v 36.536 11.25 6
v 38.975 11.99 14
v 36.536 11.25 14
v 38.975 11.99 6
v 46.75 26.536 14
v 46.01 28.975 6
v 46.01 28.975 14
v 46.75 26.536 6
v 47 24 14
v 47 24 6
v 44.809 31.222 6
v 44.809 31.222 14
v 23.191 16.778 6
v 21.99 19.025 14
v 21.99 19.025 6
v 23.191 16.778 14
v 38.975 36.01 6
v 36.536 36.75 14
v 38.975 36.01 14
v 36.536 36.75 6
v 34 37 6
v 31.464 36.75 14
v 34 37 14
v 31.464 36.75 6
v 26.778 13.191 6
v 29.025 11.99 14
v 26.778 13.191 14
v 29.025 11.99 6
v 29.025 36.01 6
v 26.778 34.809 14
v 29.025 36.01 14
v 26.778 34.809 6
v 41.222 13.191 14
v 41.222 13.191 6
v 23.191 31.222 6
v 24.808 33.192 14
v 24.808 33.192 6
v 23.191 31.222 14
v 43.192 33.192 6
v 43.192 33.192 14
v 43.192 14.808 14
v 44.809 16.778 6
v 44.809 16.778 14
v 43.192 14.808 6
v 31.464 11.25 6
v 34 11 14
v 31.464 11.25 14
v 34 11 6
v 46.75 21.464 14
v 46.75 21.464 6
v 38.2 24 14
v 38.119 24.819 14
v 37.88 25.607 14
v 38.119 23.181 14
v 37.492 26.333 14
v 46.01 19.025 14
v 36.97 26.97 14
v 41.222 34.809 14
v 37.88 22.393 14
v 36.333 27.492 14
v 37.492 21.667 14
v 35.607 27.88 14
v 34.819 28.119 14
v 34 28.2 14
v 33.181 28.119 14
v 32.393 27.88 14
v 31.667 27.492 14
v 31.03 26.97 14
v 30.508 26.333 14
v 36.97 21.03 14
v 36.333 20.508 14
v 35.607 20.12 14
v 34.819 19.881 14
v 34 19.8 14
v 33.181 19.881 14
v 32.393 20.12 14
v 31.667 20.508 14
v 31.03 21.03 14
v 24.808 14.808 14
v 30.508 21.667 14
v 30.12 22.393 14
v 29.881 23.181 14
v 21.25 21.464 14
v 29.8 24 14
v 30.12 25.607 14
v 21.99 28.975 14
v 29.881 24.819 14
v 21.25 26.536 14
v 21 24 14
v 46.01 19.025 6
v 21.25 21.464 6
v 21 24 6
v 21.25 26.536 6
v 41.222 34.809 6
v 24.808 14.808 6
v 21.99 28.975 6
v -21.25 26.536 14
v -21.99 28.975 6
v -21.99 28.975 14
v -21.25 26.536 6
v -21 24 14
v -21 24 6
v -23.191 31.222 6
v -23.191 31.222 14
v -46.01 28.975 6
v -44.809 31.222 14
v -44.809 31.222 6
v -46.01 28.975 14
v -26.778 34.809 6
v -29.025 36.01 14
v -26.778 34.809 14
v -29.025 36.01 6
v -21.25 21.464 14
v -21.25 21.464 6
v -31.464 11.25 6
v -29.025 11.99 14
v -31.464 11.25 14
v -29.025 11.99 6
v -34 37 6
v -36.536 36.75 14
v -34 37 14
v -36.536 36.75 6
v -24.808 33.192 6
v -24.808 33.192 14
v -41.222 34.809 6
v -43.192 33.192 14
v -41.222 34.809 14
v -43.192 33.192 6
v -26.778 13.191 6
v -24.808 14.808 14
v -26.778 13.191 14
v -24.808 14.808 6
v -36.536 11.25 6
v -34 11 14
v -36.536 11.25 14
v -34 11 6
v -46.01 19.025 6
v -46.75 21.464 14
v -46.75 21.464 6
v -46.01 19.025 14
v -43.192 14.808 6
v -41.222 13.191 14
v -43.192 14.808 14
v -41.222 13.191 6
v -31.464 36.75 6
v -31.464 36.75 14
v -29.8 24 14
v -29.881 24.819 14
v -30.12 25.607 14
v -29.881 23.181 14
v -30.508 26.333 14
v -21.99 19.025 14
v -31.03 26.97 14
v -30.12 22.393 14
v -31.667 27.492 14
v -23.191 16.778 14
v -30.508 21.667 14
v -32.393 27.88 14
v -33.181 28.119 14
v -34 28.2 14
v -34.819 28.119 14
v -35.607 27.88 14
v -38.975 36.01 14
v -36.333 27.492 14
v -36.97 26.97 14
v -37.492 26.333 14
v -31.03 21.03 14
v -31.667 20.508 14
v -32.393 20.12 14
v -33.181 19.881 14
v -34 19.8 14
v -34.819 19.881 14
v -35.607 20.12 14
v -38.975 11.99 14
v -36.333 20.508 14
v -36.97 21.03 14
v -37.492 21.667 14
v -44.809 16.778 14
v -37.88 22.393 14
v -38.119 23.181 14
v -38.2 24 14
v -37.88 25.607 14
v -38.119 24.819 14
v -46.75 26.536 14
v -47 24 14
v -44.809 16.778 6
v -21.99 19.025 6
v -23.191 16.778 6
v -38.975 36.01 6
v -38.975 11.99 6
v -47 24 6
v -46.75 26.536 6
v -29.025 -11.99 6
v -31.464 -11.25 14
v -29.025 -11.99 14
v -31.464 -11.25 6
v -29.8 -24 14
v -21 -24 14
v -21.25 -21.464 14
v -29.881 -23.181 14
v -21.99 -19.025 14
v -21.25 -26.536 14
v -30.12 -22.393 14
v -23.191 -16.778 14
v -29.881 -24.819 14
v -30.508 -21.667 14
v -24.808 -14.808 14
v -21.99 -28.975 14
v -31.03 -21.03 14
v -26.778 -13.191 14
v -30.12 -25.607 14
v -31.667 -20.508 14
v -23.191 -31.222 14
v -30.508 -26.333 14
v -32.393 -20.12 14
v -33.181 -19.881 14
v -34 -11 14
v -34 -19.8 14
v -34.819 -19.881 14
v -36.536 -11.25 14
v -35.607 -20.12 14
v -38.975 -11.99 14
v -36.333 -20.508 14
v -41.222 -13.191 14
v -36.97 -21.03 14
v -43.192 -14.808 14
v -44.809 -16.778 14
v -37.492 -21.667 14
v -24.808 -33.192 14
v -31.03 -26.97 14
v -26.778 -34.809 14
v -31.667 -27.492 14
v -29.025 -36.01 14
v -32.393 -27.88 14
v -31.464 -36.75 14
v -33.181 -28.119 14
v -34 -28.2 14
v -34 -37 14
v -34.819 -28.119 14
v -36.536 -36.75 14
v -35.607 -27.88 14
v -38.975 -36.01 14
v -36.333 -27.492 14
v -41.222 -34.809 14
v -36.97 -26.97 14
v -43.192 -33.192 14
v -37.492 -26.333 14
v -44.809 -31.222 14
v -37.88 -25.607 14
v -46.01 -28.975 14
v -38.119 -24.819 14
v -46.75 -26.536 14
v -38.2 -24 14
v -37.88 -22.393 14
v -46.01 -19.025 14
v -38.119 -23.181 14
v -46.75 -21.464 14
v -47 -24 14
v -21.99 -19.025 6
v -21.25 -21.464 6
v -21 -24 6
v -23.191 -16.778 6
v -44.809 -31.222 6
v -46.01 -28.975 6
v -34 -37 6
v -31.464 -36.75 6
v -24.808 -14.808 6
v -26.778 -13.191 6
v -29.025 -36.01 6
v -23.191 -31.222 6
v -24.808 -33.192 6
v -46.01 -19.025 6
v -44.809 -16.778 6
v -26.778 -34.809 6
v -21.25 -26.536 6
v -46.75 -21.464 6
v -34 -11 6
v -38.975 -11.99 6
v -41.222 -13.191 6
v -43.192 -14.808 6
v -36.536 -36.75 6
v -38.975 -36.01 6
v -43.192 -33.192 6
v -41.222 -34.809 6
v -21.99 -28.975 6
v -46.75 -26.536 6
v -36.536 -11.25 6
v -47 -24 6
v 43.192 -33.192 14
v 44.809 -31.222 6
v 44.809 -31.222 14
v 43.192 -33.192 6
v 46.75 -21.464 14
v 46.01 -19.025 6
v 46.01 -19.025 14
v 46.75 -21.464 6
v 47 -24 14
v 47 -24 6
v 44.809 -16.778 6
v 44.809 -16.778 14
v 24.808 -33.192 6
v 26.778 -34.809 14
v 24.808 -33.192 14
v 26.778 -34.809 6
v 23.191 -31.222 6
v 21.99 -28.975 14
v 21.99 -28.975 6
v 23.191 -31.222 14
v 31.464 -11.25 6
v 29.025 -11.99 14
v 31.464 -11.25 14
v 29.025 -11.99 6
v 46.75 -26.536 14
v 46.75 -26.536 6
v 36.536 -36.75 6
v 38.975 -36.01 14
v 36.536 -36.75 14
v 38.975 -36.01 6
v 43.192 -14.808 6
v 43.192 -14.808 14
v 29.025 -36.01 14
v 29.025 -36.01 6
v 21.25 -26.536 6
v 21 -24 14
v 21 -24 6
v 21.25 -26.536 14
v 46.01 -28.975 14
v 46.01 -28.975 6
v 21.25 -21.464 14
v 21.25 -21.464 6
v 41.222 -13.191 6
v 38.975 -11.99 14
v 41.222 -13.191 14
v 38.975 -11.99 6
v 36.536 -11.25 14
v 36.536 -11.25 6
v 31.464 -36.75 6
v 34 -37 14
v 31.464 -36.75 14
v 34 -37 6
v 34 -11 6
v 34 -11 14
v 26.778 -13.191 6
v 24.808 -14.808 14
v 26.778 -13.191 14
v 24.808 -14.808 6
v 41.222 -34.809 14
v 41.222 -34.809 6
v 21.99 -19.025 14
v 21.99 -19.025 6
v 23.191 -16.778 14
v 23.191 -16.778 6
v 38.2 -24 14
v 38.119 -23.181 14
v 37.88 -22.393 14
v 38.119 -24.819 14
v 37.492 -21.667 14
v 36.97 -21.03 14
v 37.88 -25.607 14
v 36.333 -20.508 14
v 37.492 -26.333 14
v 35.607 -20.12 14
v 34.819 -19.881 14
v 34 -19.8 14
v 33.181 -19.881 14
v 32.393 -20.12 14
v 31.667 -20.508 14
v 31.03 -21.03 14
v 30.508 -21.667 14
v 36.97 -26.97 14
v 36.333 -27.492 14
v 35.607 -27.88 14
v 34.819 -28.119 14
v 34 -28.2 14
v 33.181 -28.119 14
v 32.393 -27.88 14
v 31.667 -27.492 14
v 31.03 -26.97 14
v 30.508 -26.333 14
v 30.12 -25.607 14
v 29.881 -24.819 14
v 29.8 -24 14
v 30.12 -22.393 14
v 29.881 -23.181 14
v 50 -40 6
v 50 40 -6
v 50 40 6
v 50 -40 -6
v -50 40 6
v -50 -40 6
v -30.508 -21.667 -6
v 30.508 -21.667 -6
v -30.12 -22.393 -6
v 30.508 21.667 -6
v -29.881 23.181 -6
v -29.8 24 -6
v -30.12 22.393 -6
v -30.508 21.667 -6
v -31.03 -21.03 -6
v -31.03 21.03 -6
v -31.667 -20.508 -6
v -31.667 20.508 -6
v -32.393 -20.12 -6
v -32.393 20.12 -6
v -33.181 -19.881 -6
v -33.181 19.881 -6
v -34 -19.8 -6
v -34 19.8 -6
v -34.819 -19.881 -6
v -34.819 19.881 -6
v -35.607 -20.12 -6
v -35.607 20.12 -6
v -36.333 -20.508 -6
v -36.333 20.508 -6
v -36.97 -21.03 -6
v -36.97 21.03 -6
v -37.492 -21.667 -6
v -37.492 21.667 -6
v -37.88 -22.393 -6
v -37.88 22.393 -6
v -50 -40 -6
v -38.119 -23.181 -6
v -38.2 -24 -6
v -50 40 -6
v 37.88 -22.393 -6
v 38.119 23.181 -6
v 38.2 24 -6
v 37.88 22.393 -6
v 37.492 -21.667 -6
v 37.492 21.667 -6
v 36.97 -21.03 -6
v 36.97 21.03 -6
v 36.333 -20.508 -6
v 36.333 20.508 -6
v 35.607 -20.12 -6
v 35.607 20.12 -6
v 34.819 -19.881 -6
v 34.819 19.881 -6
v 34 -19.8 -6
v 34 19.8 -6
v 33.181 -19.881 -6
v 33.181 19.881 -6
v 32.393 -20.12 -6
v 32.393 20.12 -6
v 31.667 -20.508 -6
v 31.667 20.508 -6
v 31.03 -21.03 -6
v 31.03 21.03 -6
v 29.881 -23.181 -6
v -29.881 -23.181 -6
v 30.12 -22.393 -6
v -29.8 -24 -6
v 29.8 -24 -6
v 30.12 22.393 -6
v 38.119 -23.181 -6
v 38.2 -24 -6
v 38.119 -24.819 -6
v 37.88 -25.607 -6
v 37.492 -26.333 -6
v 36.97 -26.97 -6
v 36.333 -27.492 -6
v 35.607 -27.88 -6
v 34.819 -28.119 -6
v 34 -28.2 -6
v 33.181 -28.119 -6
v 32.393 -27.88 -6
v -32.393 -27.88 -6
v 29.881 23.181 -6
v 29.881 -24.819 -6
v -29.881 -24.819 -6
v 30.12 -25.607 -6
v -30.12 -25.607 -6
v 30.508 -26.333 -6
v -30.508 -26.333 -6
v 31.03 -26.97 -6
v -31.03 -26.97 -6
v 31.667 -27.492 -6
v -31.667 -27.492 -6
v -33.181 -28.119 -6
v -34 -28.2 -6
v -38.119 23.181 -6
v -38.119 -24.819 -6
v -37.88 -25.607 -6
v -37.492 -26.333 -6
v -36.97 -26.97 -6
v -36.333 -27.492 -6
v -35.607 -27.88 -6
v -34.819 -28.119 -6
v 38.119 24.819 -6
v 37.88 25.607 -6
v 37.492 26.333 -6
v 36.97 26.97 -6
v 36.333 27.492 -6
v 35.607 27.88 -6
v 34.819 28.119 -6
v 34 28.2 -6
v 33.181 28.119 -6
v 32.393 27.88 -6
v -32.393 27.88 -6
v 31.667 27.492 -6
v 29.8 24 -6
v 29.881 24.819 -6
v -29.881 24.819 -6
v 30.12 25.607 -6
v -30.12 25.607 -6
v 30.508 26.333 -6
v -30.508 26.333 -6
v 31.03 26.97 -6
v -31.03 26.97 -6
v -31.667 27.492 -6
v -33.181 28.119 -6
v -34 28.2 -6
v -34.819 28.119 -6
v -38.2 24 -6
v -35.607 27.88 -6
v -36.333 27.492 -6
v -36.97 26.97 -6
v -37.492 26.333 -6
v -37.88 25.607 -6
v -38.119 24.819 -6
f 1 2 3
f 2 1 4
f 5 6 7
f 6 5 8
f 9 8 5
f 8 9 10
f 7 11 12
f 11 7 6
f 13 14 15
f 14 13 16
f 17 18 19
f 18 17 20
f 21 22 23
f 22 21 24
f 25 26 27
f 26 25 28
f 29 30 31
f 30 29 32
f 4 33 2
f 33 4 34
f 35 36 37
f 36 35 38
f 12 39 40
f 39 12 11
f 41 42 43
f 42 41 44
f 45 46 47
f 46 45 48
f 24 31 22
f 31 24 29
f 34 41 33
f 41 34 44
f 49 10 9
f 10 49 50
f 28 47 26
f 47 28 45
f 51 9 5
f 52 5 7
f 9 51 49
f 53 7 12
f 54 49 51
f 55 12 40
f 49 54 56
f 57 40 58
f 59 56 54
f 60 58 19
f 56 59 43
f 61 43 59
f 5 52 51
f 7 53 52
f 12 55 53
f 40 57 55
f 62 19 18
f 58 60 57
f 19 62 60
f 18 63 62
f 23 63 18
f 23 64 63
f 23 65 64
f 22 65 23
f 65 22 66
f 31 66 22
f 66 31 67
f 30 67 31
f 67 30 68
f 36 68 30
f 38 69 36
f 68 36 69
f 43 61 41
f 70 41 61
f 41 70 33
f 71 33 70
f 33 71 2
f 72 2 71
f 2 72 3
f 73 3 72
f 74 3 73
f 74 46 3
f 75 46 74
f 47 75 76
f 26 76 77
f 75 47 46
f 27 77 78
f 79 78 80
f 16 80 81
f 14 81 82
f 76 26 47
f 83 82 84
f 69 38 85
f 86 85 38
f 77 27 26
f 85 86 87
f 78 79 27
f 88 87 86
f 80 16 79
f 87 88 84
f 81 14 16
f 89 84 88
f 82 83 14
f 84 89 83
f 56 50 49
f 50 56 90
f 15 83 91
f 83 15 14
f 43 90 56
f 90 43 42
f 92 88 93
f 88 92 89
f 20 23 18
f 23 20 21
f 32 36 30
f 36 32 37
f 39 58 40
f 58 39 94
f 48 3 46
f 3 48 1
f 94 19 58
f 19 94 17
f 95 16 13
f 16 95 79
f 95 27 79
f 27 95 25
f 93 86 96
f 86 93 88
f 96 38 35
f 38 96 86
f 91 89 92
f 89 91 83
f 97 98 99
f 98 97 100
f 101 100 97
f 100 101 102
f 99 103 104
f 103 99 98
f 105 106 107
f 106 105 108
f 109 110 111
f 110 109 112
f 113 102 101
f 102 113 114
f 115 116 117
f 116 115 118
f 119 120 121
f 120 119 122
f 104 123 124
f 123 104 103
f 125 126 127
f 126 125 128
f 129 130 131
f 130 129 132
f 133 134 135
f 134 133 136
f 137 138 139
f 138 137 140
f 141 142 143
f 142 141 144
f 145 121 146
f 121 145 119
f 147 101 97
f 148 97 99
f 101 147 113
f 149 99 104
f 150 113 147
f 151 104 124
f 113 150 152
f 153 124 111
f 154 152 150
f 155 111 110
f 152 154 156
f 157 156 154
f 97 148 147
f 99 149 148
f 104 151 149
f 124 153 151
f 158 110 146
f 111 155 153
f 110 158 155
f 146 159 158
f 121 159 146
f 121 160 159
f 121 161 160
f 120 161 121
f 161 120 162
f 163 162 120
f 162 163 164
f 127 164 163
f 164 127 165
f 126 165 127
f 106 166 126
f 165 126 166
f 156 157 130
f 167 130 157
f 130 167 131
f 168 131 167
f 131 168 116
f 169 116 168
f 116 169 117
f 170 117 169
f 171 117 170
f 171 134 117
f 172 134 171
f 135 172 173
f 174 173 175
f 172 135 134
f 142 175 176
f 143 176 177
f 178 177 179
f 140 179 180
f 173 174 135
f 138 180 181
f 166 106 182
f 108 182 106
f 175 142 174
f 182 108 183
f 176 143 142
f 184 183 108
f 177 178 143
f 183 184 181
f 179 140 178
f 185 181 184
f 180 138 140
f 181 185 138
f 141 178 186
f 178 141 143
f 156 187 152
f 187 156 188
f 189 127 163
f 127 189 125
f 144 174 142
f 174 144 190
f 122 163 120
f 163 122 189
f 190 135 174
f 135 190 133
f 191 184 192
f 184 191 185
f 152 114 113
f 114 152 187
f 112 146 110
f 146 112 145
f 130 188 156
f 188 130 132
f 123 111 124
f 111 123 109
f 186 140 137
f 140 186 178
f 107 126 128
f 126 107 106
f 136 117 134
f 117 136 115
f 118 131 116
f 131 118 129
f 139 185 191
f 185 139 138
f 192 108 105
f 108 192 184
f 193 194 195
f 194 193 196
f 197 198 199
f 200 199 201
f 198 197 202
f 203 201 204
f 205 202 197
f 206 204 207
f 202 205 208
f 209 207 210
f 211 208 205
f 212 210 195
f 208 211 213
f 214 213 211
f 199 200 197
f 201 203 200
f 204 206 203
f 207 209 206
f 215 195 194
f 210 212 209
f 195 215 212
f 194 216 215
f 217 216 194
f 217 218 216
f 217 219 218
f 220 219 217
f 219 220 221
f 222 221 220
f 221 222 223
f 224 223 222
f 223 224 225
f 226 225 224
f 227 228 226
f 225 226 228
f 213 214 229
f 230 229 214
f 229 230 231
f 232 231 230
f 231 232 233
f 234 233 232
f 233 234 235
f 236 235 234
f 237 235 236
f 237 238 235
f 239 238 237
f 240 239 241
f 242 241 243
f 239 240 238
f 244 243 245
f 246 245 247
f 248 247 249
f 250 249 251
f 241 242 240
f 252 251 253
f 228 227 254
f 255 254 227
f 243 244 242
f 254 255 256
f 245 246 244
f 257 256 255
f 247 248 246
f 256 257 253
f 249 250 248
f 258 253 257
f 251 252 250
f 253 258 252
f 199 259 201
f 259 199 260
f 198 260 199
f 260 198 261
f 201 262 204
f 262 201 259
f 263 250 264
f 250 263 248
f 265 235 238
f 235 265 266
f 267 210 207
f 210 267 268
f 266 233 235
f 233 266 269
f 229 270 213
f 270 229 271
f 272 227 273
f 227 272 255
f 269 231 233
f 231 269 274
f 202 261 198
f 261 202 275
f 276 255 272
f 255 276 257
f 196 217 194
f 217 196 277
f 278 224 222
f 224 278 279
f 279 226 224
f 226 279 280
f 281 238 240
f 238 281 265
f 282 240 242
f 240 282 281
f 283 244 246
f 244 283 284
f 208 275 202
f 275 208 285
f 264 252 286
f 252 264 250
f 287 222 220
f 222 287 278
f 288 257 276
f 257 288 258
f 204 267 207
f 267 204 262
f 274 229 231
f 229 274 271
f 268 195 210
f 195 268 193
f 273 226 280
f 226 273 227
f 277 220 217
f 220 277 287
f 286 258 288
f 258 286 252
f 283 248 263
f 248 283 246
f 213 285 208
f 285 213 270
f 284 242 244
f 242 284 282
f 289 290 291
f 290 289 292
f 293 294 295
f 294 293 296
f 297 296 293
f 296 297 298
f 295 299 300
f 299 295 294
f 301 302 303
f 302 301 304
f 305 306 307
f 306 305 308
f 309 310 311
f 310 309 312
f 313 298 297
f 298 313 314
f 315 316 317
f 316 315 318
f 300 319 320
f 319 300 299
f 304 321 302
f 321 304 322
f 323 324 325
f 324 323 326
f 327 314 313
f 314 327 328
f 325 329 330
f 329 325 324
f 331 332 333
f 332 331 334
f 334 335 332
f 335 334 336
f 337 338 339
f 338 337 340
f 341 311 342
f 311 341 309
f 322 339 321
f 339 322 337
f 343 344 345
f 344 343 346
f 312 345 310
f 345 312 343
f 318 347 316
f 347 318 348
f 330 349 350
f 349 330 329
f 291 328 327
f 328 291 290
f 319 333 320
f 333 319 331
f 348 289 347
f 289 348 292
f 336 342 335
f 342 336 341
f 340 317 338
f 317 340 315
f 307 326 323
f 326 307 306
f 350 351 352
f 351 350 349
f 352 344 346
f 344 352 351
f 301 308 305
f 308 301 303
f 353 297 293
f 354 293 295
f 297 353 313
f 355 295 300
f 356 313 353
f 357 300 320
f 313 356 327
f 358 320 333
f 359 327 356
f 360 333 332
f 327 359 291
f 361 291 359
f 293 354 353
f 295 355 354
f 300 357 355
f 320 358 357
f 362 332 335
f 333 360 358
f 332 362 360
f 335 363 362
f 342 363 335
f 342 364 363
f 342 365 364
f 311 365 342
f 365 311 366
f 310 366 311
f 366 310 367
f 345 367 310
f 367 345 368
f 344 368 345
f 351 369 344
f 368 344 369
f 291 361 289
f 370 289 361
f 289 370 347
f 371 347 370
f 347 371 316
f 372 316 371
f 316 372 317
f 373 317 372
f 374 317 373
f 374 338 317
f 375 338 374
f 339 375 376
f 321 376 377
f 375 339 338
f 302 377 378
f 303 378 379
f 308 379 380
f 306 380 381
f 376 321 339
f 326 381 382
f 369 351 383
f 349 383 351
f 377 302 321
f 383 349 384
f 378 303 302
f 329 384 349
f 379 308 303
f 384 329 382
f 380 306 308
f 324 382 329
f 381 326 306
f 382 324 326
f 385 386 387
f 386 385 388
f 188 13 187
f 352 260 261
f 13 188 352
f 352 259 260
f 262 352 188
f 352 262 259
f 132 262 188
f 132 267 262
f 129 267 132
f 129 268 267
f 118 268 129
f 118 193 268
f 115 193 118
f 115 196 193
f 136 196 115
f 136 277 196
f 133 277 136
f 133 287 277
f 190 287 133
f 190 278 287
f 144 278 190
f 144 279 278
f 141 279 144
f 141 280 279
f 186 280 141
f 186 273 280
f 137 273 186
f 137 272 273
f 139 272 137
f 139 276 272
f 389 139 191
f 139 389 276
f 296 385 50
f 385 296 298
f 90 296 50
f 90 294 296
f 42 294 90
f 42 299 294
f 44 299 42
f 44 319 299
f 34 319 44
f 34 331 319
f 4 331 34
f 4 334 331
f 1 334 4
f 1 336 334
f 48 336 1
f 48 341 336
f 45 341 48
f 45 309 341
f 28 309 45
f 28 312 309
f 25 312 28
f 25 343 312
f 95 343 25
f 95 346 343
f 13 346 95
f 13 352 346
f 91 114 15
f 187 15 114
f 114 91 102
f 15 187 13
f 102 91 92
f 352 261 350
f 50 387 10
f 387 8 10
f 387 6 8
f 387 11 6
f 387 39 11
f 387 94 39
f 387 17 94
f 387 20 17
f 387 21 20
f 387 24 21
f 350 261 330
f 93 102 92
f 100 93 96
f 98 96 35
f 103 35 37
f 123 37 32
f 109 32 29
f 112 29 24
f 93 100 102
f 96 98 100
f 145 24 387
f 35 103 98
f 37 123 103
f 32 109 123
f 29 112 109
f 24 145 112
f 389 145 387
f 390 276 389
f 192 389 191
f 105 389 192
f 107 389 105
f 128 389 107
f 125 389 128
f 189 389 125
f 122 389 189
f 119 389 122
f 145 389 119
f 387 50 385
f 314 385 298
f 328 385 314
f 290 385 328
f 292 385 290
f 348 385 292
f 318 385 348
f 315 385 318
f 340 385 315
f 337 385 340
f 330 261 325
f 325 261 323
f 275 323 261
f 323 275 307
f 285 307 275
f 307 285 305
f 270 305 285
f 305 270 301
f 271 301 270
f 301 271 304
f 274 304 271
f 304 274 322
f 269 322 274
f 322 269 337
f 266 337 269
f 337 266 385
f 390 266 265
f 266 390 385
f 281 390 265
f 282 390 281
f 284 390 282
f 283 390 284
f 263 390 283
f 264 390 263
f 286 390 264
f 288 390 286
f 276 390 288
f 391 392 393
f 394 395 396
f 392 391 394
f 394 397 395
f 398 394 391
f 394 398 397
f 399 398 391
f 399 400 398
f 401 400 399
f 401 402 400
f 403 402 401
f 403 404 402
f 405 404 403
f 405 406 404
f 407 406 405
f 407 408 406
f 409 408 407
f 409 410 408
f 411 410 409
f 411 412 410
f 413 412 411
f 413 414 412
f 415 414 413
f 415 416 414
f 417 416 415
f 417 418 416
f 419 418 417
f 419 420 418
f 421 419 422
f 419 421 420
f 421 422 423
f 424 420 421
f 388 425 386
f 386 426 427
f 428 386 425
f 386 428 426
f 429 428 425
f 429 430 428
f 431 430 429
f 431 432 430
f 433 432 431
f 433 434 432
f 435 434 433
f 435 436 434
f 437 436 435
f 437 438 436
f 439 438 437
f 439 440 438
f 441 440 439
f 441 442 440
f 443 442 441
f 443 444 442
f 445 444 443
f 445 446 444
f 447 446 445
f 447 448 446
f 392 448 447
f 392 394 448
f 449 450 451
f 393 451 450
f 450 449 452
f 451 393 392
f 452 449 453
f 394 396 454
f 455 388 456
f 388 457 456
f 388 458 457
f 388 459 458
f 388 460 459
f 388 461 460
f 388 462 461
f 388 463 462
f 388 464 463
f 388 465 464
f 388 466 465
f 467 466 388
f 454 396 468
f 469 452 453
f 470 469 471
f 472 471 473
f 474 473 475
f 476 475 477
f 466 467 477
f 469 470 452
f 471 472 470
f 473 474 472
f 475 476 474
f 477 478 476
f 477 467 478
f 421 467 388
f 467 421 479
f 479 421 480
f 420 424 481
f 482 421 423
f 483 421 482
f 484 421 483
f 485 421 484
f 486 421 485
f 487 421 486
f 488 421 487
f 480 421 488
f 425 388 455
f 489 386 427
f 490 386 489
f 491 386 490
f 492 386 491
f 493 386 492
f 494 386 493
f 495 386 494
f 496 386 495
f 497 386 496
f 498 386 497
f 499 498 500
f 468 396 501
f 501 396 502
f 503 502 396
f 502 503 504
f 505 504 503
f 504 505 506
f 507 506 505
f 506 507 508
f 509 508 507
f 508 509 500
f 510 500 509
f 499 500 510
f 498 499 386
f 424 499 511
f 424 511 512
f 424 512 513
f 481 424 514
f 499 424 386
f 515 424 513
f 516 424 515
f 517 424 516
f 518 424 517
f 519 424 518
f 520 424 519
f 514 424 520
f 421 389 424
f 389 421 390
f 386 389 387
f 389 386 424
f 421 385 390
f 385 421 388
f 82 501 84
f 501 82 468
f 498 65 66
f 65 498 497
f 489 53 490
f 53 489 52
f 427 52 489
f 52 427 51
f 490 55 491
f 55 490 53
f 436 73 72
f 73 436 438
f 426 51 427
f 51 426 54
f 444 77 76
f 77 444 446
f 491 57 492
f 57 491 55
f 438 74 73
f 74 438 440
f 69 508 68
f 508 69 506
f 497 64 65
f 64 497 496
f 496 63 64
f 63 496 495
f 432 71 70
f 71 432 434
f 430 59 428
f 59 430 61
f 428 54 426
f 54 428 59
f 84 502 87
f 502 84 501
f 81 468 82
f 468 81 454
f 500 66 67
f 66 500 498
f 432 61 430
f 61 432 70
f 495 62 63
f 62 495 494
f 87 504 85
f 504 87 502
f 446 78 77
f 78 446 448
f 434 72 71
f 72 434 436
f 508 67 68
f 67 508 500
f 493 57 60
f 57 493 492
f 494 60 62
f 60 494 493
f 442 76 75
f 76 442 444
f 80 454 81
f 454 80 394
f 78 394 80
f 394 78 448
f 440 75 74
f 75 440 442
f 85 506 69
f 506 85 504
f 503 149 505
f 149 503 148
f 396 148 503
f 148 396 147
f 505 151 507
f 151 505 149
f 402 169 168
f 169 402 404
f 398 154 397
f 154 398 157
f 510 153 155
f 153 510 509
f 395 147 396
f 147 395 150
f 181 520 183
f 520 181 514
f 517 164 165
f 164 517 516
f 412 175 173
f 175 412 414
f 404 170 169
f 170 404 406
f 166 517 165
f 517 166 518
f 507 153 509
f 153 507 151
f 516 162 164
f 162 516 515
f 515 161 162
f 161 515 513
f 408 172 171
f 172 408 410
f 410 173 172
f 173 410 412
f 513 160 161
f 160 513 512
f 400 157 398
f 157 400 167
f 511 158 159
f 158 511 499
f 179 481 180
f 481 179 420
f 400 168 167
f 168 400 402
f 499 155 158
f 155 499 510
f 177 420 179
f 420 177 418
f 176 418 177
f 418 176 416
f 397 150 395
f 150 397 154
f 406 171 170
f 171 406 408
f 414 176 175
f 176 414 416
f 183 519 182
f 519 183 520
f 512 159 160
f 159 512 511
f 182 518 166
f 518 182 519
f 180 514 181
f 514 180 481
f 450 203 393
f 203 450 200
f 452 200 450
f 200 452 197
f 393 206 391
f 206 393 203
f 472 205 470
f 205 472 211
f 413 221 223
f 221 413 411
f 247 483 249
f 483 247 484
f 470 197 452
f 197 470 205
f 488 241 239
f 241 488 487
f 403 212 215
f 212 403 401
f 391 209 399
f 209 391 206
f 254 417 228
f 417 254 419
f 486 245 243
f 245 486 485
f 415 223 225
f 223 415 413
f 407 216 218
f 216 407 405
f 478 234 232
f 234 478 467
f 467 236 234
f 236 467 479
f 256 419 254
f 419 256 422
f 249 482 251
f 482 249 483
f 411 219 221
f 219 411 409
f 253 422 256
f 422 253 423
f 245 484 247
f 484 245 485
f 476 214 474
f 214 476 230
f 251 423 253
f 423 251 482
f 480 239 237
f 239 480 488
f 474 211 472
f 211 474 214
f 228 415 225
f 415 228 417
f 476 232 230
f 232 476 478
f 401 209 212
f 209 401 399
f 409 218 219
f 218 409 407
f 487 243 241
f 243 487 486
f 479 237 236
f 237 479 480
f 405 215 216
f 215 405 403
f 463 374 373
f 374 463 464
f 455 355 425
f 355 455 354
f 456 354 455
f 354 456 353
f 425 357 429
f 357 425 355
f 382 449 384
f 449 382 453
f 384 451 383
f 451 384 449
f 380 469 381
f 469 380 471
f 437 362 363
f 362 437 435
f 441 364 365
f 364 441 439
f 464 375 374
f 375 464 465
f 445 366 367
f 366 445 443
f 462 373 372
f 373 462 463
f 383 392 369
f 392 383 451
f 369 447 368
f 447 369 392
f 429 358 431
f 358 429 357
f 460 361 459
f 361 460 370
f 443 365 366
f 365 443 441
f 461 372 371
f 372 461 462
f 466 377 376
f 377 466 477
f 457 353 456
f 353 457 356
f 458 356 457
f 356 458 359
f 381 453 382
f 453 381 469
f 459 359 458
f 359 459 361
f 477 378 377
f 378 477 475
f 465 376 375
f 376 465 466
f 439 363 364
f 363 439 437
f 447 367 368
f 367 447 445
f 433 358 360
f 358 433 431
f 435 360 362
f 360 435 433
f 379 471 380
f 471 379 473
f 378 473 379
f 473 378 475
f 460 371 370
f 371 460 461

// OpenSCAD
$fn = 32;

// ----------------------------------------------------------------------
// Anchor pads 100 x 80 x 20
// four corner bosses with anchor holes
// ----------------------------------------------------------------------

// --- parameters (mm) ---
plate = [100, 80, 12];  // base plate size (x, y, z)
pads = 4;               // boss count, one per corner
edge = 16;              // boss centre offset from the plate edge
boss_d = 26;            // boss diameter
boss_h = 8;             // boss height above the base plate
hole_d = 8.4;           // hole diameter

// --- derived feature positions (mm) ---
height = plate[2] + boss_h;      // = 20   overall height of the part
corner_x = plate[0] / 2 - edge;  // = 34   boss centre X
corner_y = plate[1] / 2 - edge;  // = 24   boss centre Y
feature_centers = [
  [corner_x, corner_y],
  [-corner_x, corner_y],
  [-corner_x, -corner_y],
  [corner_x, -corner_y]
];   // boss centres, anchor holes are drilled there

// base plate, four bosses standing on it, anchor holes all the way through
difference() {
  union() {
    cube(plate, center = true);
    for (centre = feature_centers)
      translate([centre[0], centre[1], plate[2] / 2 - 1])
        cylinder(d = boss_d, h = boss_h + 1);
  }
  for (centre = feature_centers)
    translate([centre[0], centre[1], -height])
      cylinder(d = hole_d, h = 2 * height + 2);  // through boss and plate
}
